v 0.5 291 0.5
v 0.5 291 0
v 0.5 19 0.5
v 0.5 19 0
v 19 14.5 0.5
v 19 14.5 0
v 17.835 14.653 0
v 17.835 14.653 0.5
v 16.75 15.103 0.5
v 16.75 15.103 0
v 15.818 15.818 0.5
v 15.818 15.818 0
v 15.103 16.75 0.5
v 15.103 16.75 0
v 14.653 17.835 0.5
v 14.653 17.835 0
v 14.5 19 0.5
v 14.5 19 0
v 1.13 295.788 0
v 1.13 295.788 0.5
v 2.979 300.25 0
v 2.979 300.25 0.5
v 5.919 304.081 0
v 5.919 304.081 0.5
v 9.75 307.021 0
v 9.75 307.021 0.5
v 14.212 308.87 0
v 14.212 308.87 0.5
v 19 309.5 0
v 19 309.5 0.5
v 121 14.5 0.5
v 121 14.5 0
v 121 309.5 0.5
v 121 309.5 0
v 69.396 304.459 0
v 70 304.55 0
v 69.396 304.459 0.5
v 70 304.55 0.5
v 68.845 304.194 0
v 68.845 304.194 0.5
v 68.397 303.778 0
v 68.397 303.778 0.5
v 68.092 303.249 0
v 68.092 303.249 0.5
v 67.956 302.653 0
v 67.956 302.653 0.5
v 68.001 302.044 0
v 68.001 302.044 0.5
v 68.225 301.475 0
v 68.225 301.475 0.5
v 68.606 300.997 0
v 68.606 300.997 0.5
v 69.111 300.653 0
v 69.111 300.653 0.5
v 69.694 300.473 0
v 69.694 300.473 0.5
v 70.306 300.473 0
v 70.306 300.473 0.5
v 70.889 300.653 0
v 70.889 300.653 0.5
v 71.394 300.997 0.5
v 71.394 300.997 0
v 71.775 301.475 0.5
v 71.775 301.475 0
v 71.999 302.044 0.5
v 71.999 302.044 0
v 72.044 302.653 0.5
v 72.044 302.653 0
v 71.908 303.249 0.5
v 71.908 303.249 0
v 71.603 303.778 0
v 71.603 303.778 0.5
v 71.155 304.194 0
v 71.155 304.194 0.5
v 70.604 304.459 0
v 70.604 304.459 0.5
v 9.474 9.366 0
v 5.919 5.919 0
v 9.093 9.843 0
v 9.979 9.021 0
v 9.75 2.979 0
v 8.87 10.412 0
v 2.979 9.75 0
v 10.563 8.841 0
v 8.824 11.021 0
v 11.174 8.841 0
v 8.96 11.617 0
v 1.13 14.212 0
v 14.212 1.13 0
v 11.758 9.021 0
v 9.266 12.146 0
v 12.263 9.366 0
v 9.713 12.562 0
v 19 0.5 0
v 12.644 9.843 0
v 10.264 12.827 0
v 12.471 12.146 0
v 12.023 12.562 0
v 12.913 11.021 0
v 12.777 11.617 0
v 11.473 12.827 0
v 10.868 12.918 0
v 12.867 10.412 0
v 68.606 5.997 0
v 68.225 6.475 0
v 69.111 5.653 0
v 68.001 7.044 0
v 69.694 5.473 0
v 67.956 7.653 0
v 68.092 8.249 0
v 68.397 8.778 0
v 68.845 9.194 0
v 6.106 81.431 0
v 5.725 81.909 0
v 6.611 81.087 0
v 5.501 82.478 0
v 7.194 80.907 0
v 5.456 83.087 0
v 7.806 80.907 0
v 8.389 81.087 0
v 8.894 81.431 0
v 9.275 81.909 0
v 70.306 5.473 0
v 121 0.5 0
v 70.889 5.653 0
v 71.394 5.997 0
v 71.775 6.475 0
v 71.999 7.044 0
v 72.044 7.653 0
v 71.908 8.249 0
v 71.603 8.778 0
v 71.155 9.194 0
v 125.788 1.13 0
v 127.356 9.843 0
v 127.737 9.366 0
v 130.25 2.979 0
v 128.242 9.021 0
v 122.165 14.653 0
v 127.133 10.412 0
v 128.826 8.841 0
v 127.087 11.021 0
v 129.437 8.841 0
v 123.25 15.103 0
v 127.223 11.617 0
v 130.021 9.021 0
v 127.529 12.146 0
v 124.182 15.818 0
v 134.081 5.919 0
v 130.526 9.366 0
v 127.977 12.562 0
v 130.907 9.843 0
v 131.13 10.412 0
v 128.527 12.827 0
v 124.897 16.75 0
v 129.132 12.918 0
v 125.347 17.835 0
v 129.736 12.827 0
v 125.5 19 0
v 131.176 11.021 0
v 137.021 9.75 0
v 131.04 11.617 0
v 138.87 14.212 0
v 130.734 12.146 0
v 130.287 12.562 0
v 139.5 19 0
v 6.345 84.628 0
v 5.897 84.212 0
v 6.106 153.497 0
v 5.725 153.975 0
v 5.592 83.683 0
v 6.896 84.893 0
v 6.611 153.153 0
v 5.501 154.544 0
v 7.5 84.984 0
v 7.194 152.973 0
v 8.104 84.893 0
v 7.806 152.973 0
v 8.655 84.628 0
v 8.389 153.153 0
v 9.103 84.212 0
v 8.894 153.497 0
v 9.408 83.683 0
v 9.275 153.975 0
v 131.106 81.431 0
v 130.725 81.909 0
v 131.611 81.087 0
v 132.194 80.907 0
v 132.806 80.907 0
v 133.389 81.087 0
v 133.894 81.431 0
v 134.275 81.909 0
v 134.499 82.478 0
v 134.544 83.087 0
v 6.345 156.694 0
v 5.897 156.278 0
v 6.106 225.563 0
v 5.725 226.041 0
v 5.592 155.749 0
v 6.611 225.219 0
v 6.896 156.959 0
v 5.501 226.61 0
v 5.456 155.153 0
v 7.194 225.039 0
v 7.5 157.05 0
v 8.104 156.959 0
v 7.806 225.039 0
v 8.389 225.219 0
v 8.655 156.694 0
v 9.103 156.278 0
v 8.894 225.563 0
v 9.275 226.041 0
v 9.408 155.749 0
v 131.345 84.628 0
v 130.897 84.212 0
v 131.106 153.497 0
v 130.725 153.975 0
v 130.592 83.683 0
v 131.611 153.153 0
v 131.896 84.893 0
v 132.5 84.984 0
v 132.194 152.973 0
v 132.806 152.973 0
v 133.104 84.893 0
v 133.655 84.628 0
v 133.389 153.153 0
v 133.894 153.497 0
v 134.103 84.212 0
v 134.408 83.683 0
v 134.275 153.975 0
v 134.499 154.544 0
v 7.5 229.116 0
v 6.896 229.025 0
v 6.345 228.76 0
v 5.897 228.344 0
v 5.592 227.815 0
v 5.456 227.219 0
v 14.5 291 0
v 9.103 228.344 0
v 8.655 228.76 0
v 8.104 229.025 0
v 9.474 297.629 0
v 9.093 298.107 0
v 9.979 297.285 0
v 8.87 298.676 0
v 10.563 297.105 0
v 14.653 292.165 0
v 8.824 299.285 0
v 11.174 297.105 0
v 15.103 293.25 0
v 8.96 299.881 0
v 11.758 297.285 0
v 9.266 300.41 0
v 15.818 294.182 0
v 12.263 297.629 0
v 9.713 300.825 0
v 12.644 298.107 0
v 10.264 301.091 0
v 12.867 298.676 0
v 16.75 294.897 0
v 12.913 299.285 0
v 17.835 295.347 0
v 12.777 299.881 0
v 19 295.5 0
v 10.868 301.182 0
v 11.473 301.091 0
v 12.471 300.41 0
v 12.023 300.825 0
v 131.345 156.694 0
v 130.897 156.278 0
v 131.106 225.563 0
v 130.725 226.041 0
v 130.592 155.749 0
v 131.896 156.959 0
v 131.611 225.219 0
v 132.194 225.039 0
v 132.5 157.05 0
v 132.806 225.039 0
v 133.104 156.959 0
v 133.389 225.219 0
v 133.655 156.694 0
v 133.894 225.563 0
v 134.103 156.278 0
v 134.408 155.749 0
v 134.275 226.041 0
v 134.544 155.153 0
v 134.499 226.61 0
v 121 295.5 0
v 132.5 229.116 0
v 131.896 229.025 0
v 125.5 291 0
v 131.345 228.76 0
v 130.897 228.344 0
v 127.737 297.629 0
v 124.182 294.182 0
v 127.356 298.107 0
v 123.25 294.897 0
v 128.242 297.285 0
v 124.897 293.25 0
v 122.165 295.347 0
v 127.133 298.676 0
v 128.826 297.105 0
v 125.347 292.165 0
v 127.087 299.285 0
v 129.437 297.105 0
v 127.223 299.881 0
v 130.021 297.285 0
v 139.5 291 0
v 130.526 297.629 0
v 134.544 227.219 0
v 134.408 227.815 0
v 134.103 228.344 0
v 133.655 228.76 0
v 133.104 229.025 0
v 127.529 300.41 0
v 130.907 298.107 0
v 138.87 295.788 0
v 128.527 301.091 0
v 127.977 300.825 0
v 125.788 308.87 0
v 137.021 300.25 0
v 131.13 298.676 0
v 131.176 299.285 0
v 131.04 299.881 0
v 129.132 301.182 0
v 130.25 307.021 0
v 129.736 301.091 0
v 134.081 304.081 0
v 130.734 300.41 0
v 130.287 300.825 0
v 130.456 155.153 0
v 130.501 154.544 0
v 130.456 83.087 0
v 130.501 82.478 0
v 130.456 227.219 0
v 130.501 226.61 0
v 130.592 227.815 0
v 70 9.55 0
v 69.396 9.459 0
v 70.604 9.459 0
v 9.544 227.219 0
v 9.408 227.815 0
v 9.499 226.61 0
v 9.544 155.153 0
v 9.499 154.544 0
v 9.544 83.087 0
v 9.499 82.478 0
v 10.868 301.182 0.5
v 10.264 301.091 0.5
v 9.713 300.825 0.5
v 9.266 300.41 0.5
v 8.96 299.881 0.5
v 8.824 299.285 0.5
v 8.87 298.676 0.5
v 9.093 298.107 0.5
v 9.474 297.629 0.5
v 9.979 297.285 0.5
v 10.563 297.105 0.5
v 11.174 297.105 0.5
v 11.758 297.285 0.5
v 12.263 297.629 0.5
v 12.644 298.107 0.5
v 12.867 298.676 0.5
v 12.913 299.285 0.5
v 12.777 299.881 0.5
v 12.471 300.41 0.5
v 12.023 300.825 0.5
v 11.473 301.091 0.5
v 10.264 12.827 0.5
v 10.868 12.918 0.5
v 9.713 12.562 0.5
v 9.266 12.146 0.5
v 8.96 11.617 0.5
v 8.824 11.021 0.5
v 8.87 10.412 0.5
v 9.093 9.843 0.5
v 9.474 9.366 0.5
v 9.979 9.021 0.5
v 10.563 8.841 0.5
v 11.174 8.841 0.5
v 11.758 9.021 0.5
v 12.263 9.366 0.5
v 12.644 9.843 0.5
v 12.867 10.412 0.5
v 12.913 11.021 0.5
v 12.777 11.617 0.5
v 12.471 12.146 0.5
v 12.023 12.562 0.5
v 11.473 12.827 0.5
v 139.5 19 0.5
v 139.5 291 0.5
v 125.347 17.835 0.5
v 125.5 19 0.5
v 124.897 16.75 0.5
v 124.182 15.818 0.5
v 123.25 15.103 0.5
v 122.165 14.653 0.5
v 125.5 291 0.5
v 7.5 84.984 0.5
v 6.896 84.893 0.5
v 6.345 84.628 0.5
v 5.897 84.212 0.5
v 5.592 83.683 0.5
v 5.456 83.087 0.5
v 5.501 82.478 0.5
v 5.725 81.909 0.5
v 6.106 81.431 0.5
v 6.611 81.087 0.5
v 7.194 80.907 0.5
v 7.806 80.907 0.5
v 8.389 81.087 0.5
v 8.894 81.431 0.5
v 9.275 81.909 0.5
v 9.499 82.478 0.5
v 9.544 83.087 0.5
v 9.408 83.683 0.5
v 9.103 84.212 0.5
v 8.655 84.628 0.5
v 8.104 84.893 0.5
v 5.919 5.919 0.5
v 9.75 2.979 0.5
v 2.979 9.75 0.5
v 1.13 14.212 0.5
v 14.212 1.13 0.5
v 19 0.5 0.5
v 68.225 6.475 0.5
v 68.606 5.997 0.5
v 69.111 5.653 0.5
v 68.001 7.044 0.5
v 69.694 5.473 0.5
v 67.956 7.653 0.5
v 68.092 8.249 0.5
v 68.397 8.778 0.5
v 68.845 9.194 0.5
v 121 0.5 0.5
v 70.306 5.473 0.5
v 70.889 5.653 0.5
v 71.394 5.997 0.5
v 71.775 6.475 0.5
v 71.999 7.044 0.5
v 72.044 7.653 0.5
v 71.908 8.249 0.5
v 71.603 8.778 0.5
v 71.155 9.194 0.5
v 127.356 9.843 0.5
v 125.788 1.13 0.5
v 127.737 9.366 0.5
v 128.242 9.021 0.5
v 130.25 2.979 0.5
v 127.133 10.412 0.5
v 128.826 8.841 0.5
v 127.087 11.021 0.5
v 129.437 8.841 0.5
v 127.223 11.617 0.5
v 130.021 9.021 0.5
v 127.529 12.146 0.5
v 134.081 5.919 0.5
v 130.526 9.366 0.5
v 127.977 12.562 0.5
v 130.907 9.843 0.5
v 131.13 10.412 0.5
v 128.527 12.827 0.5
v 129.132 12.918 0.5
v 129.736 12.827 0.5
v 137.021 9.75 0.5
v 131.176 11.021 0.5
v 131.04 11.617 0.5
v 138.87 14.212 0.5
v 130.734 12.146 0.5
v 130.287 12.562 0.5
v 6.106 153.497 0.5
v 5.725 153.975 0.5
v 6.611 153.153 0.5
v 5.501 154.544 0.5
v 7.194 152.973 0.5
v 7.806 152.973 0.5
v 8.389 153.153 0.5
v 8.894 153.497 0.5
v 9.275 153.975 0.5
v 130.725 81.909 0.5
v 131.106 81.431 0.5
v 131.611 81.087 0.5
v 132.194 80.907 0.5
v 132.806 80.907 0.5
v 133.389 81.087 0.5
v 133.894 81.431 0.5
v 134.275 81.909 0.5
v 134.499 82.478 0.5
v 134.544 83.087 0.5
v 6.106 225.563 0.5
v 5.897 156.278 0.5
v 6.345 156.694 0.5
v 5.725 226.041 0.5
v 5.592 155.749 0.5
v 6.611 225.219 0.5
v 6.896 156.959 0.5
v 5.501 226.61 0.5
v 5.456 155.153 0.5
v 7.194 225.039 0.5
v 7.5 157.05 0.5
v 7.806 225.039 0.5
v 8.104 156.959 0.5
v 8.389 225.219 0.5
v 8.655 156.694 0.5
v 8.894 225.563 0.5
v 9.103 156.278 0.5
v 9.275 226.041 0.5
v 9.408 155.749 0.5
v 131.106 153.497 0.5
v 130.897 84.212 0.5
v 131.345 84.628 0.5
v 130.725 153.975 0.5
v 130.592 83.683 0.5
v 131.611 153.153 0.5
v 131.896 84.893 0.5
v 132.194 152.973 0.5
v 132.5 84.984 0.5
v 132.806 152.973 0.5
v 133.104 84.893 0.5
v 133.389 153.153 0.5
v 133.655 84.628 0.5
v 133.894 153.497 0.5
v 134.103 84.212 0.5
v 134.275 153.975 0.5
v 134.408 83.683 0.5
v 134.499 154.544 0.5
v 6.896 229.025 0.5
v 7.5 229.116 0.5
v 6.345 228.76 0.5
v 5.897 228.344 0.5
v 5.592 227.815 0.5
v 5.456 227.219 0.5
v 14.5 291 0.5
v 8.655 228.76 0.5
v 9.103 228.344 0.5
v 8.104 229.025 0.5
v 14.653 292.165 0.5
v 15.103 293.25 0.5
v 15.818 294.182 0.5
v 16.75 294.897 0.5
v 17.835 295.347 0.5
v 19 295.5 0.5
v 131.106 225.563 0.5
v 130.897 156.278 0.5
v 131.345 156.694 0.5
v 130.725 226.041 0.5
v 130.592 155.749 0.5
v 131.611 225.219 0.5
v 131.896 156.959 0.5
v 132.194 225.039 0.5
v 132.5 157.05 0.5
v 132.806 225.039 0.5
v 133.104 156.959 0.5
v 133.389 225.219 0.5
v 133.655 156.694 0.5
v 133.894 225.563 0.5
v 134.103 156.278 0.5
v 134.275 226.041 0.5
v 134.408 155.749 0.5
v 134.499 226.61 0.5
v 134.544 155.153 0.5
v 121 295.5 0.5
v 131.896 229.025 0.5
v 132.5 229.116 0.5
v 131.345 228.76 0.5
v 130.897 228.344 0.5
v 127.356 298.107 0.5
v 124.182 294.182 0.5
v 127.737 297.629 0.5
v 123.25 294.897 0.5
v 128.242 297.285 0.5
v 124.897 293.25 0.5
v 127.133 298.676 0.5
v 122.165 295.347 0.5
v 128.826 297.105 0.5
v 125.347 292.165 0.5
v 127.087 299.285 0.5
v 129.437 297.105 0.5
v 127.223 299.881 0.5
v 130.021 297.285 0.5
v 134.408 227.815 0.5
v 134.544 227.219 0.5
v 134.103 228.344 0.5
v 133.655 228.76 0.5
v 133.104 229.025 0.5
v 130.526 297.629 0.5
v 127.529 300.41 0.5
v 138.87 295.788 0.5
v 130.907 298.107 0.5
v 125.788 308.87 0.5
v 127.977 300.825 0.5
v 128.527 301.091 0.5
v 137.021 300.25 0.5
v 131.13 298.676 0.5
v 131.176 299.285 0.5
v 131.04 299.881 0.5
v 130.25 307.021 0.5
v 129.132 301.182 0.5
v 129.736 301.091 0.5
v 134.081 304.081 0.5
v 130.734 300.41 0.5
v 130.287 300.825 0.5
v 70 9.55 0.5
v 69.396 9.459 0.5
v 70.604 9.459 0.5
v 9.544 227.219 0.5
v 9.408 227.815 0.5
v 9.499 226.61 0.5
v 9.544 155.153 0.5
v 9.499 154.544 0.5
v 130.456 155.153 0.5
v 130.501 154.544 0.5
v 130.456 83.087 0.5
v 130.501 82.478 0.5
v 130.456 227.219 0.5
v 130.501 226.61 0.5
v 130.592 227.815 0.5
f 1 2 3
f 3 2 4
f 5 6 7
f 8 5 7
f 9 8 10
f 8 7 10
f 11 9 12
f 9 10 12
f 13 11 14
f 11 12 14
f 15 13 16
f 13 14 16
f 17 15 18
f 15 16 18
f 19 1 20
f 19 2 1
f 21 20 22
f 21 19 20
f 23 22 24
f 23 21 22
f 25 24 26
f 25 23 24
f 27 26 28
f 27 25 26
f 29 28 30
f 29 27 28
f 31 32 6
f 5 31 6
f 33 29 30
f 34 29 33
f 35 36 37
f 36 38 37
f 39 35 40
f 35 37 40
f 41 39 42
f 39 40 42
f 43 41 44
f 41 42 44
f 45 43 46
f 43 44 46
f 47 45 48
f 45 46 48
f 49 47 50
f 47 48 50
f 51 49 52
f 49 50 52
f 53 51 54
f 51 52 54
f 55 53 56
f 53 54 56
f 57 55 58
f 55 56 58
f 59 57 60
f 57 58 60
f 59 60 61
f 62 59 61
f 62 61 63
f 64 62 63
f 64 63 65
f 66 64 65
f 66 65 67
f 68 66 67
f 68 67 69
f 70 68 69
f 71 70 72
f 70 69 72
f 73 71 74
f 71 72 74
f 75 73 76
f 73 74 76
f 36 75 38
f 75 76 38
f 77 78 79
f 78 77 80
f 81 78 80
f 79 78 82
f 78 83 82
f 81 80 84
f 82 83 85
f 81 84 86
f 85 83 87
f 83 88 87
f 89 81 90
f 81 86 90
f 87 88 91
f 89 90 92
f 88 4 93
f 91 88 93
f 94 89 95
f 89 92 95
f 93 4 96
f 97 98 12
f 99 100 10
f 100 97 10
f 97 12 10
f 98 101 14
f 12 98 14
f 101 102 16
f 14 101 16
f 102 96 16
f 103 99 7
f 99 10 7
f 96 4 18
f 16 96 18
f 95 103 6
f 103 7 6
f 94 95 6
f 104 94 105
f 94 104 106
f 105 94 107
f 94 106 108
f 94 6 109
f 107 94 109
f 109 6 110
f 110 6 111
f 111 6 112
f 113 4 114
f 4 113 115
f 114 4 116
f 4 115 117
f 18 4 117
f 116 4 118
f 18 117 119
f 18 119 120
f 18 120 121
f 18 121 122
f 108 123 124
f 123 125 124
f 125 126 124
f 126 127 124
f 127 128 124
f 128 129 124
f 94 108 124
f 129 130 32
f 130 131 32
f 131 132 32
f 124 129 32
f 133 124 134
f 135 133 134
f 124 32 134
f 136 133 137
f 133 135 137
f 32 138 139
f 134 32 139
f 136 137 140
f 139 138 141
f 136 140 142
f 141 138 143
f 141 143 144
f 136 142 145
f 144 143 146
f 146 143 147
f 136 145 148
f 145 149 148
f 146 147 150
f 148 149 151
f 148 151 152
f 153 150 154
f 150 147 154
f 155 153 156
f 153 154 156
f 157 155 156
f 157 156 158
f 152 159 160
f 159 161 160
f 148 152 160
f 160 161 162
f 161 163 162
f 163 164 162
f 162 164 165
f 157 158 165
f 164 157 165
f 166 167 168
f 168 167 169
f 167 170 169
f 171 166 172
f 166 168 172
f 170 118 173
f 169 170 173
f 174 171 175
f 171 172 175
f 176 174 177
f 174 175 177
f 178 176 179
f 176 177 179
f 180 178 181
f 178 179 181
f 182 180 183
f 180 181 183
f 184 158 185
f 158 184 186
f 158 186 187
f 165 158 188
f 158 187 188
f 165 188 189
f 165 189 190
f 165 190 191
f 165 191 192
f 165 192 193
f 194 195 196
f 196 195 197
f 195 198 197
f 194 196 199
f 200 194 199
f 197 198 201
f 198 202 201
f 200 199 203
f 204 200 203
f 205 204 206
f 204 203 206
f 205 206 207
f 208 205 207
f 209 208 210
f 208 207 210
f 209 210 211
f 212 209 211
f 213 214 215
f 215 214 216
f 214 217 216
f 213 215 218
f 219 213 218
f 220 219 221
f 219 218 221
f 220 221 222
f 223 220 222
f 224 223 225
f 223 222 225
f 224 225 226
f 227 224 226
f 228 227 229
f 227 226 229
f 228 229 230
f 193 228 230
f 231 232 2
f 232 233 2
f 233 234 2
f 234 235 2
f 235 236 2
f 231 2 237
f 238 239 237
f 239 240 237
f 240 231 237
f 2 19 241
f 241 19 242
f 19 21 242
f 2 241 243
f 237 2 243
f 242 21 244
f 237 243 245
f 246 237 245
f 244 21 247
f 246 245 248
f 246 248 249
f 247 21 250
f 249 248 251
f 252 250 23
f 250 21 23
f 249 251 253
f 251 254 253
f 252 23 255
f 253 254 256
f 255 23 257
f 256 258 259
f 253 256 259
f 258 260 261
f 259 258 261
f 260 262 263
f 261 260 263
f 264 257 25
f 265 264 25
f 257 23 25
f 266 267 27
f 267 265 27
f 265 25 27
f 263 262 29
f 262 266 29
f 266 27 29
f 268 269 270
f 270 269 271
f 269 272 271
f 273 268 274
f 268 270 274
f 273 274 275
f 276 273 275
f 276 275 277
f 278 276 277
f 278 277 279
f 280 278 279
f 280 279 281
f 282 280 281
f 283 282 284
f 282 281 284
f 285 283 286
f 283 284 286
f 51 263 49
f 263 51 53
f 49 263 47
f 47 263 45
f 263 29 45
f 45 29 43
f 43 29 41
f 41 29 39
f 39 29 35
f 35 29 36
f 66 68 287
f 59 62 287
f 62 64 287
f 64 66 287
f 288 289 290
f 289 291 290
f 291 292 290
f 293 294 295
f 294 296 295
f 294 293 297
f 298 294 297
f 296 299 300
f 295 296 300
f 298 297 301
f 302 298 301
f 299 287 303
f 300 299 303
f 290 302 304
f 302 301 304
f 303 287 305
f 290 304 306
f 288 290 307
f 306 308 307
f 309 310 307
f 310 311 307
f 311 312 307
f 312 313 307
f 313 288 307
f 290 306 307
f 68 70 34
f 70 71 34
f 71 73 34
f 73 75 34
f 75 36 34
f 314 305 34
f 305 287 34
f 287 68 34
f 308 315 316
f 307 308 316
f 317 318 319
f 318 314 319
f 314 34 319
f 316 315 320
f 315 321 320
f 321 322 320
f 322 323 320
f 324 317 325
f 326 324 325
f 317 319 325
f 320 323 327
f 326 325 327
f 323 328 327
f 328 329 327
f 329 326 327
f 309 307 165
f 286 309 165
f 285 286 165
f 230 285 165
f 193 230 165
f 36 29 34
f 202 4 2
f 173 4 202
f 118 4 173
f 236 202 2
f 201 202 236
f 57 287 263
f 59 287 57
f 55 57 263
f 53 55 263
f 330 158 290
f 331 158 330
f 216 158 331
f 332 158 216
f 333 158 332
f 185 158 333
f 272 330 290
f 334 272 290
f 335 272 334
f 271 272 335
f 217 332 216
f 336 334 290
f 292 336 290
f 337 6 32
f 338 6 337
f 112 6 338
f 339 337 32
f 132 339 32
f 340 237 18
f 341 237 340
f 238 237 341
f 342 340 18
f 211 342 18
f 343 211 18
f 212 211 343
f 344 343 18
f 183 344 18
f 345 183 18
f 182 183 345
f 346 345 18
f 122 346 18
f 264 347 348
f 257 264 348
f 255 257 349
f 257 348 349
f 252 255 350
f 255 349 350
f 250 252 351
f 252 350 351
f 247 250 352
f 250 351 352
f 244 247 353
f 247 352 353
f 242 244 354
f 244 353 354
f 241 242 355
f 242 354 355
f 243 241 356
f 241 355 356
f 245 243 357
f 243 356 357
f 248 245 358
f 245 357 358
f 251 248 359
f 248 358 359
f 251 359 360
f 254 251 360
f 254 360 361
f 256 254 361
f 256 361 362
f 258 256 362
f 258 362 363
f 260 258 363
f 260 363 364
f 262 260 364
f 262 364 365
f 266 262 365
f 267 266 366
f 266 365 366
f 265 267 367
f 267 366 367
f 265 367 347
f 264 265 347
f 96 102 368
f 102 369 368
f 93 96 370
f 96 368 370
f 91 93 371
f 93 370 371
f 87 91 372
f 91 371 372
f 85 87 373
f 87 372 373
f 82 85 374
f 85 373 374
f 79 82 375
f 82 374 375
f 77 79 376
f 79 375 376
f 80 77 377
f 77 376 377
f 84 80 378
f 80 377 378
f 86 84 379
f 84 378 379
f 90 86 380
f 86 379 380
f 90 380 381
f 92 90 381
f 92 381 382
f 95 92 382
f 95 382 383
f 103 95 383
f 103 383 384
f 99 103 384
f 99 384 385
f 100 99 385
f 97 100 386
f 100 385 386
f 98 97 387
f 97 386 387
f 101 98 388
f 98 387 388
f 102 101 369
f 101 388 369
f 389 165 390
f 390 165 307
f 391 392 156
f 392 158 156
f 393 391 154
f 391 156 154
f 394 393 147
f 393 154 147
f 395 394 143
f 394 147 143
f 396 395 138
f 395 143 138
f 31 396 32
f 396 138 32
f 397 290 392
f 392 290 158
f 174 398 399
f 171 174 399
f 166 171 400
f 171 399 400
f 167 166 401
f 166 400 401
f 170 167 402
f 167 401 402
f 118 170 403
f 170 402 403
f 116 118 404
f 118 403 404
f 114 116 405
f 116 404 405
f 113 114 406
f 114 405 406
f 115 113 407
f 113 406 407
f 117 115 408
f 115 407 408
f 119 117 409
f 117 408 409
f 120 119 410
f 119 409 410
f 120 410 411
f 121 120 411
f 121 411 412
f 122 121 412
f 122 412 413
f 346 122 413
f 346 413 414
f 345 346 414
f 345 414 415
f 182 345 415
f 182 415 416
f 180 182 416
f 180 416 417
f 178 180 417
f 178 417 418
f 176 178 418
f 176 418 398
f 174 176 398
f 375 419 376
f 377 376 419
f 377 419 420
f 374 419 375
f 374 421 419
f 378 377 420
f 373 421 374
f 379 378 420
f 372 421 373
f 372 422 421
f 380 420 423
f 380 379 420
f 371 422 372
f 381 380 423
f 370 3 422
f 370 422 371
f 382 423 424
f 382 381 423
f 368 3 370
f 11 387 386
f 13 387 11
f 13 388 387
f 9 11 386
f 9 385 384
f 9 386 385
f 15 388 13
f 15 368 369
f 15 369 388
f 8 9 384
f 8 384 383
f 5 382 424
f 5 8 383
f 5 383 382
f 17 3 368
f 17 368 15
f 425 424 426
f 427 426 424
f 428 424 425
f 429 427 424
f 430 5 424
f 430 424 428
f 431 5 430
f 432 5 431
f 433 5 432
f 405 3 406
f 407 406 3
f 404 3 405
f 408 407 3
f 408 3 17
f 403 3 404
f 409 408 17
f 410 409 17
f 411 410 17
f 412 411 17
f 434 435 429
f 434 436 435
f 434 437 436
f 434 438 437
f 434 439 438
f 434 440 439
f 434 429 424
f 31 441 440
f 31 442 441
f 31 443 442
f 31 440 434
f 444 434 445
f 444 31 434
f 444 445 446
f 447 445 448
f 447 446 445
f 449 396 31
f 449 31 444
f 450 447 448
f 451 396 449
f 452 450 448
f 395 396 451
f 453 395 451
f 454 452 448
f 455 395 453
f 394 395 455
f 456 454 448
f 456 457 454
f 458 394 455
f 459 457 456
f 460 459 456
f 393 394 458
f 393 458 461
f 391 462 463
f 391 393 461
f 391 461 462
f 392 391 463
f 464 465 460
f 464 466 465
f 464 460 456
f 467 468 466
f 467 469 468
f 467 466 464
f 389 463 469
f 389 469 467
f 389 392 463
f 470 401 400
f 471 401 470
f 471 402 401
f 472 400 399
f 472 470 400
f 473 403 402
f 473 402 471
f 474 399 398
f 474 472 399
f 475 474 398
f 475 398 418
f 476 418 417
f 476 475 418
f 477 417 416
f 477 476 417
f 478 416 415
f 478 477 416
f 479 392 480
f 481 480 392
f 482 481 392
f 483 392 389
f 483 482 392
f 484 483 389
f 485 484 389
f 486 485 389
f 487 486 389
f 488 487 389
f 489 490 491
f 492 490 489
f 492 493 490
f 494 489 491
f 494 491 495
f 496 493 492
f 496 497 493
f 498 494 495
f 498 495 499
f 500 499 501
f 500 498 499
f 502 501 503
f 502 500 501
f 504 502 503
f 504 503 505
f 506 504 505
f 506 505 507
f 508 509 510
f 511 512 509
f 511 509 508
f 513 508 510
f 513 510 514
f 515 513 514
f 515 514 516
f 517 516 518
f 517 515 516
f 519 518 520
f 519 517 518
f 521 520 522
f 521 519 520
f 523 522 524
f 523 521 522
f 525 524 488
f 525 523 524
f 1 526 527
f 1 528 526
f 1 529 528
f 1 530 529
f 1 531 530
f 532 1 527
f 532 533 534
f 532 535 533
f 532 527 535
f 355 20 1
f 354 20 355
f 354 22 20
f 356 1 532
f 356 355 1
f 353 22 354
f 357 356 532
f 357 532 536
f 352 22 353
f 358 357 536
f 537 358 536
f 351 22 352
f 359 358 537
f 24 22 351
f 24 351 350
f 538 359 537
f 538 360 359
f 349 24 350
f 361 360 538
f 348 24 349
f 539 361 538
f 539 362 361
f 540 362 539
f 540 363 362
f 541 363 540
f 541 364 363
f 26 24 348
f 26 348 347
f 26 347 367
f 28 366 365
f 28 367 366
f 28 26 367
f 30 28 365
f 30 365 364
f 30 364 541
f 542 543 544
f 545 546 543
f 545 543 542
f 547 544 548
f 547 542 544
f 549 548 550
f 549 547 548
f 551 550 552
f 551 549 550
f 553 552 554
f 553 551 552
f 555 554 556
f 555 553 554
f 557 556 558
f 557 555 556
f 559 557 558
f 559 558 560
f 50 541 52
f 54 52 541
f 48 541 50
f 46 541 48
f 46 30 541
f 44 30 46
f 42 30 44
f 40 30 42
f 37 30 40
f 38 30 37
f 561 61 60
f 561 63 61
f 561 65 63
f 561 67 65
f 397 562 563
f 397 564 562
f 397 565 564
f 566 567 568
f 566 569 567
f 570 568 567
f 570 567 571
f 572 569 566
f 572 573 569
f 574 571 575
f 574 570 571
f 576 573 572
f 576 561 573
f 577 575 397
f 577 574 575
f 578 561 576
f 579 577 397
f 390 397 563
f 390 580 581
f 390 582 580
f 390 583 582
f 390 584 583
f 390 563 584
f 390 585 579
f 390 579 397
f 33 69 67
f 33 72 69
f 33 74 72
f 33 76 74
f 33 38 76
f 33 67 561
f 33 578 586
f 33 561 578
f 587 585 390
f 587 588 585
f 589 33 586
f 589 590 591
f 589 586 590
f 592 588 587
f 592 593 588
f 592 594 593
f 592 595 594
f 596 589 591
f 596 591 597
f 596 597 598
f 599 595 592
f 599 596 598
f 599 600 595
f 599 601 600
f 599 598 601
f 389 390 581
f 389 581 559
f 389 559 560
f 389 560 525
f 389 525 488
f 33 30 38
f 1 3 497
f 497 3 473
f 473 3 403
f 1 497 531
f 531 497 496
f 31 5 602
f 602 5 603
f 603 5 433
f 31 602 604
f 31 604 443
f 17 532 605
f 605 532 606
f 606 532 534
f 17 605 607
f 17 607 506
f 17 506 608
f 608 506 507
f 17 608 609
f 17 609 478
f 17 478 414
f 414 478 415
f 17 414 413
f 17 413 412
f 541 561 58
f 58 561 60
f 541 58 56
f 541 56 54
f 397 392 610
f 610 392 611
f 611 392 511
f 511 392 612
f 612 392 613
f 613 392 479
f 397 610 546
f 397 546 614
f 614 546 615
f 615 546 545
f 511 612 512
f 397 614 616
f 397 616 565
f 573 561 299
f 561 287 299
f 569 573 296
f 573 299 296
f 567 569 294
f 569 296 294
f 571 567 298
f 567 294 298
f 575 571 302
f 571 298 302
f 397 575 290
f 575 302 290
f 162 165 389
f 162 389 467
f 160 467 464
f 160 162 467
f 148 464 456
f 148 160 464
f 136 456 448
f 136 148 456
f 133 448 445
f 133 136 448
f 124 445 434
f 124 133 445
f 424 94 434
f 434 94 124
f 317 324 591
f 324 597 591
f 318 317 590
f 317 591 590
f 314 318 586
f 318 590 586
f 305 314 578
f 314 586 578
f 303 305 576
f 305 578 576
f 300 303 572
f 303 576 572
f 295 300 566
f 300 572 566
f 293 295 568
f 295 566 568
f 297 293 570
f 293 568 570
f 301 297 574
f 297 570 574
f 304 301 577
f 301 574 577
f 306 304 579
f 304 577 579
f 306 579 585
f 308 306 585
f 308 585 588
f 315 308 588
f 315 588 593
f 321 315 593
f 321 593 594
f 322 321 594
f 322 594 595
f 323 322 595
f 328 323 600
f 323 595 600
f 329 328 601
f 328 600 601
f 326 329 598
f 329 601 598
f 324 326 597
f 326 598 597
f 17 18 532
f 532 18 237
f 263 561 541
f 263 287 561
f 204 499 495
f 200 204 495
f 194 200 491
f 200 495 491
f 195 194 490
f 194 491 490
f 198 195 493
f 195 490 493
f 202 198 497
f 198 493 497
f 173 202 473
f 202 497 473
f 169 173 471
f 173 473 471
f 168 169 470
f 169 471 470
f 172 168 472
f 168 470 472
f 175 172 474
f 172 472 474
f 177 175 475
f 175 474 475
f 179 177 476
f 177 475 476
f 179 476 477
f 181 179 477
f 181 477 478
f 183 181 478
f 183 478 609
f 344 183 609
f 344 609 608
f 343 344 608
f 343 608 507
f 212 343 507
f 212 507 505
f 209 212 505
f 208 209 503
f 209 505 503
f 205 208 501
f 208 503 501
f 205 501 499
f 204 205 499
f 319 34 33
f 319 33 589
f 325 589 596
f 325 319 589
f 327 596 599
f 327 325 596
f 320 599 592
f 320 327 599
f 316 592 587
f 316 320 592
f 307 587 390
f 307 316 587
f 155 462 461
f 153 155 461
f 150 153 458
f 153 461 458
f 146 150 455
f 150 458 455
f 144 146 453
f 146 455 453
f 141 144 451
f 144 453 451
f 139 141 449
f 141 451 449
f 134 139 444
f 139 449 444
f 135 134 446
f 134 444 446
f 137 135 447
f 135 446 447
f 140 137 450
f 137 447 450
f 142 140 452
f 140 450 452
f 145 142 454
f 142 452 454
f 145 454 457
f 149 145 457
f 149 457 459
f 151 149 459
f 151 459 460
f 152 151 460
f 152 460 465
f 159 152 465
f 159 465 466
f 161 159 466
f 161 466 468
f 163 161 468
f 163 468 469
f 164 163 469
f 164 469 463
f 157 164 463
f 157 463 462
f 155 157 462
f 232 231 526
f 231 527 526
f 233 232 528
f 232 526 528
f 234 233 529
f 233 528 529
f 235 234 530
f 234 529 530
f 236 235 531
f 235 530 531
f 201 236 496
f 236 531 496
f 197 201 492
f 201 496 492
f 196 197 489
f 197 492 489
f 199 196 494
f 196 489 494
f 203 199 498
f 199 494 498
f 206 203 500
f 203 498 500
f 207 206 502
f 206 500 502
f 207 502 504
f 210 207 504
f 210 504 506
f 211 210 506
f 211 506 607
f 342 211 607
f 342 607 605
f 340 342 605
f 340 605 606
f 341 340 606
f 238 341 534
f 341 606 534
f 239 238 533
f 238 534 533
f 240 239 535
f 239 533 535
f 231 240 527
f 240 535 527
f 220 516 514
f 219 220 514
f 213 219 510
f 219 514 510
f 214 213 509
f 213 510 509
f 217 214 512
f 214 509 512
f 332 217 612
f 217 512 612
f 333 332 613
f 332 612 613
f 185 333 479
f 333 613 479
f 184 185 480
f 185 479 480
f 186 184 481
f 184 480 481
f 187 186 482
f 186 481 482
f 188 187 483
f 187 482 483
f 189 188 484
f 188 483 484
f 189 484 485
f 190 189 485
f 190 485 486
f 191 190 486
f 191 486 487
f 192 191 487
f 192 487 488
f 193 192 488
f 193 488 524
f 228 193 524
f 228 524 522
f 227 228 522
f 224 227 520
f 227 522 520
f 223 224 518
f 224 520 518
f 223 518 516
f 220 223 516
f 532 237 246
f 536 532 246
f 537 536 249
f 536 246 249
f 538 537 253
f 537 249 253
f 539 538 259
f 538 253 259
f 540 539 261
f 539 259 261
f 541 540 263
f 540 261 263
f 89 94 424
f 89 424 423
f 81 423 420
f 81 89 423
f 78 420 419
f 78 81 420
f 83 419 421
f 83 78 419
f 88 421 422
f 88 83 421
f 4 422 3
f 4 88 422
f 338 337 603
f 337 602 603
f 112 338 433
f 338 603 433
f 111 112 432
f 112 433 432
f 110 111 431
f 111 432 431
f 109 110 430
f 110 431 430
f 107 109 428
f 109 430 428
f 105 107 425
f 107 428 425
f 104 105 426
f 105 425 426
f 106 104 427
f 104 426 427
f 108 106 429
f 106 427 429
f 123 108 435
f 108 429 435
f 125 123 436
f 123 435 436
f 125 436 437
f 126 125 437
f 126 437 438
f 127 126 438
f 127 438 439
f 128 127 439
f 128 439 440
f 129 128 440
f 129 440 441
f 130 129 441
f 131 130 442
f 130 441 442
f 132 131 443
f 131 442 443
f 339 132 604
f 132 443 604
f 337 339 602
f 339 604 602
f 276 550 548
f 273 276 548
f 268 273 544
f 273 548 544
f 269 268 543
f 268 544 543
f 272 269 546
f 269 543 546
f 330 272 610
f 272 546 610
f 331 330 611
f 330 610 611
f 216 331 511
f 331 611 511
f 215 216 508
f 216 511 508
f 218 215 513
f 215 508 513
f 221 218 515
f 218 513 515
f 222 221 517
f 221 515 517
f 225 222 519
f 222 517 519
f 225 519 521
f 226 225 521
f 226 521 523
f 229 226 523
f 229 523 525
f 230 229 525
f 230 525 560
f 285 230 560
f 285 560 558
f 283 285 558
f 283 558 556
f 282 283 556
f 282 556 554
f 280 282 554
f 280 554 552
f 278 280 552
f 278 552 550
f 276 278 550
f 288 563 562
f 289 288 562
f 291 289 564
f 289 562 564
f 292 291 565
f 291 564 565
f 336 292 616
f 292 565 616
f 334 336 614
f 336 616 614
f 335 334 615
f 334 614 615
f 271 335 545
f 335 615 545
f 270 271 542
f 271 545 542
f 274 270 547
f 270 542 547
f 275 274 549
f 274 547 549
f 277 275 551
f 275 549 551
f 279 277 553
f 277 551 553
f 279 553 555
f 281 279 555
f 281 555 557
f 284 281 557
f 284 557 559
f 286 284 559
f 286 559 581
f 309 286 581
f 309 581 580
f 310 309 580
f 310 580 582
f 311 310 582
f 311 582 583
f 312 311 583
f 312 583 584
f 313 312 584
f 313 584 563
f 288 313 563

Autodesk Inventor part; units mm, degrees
ref_plane "YZ Plane" through (0, 0, 0) normal (1, 0, 0) x (0, 1, 0)
ref_plane "XZ Plane" through (0, 0, 0) normal (0, 1, 0) x (-1, 0, 0)
ref_plane "XY Plane" through (0, 0, 0) normal (0, 0, 1) x (1, 0, 0)
sketch "Sketch1" plane through (0, 0, 0) normal (0, 0, 1) x (1, 0, 0)
  line L0 (0, 0) -> (140, 0) construction
  line L1 (140, 0) -> (140, 310) construction
  line L2 (140, 310) -> (0, 310) construction
  line L3 (0, 310) -> (0, 0) construction
  line L4 (15, 295) -> (125, 295) construction
  line L5 (125, 295) -> (125, 15) construction
  line L6 (125, 15) -> (15, 15) construction
  line L7 (15, 15) -> (15, 295) construction
  line L8 (15, 295) -> (125, 295) construction
  line L9 (70, 314.0975) -> (70, 322.6254) construction
  line L10 (15, 295) -> (15, 269.8596) construction
  line L11 (125, 295) -> (125, 292.6022) construction
  line L12 (0, 165.5) -> (-18, 165.5) construction
  line L13 (-18, 165.5) -> (-18, 185.5) construction
  line L14 (-18, 185.5) -> (0, 185.5) construction
  line L15 (0, 185.5) -> (0, 165.5) construction
  line L16 (-24.3067, 155) -> (-34.4998, 155) construction
  circle A0 centre (-9, 175.5) radius 3 construction
  line L17 (-18, 185.5) -> (0, 205.5) construction
  line L18 (0, 144.5) -> (-18, 144.5) construction
  line L19 (-18, 144.5) -> (-18, 124.5) construction
  circle A1 centre (-9, 134.5) radius 3 construction
  line L20 (-18, 124.5) -> (0, 104.5) construction
  line L21 (140, 165.5) -> (158, 165.5) construction
  line L22 (158, 165.5) -> (158, 185.5) construction
  circle A2 centre (149, 175.5) radius 3 construction
  line L23 (158, 185.5) -> (140, 205.5) construction
  line L24 (158, 144.5) -> (158, 124.5) construction
  line L25 (140, 144.5) -> (158, 144.5) construction
  circle A3 centre (149, 134.5) radius 3 construction
  line L26 (158, 124.5) -> (140, 104.5) construction
  line L27 (0, 300.2843) -> (9.7157, 310) construction
  line L28 (140, 300.2843) -> (130.2843, 310) construction
  line L29 (0, 9.7157) -> (9.7157, 0) construction
  line L30 (140, 9.7157) -> (130.2843, 0) construction
  line L31 (70, 295) -> (70, 310) construction
  line L32 (0, 155) -> (15, 155) construction
  line L33 (23.9173, 286.0827) -> (15, 295) construction
  line L34 (16.5096, 292.7523) -> (17.2477, 293.4904) construction
  line L35 (23.9173, 286.0827) -> (16.8787, 293.1213) construction
  line L36 (123.4904, 292.7523) -> (122.7523, 293.4904) construction
  line L37 (15, 17.2679) -> (15, 136.2679) construction
  arc A4 (14, 16.2679) -> (15, 17.2679) centre (14, 17.2679) ccw construction
  line L38 (14, 16.2679) -> (12, 16.2679) construction
  arc A5 (17, 17.2679) -> (18, 16.2679) centre (18, 17.2679) ccw construction
  spline S0 degree 3 poles (123.4904, 292.7523) (126.7806, 289.462) (122.6845, 284.0803) (122.5, 267.9145) knots 0 0 0 0 1 1 1 1 construction
  line L39 (15.2393, 288.9289) -> (15.2393, 218.384) construction
  line L40 (125, 148.5289) -> (125, 140.8711) construction
  line L41 (-110.1015, 148.4668) -> (-137.337, 121.2312) construction
  line L42 (-137.337, 121.2312) -> (-99.9418, 121.2312) construction
  line L43 (209.7417, 198.7679) -> (209.7417, 184.7679) construction
  line L44 (15, 148.5289) -> (15, 140.2675) construction
  line L45 (125, 148.5289) -> (125, 140.2675) construction
  spline S1 degree 4 poles (17.2477, 293.4904) (18.1955, 294.4381) (19.6714, 295.0826) (20.7017, 295) (21.8623, 295) knots 0 0 0 0 0 1 1 1 1 1 construction
  spline S2 degree 3 poles (122.7523, 293.4904) (121.4886, 294.7541) (119.4432, 295.1927) (118.1377, 295) knots 0 0 0 0 1 1 1 1 construction
  line L46 (118.1377, 295) -> (21.8623, 295) construction
  line L47 (16.8787, 293.1213) -> (23.2316, 286.7684) construction
  arc A6 (19, 310) -> (0, 291) centre (19, 291) ccw construction
  arc A7 (19, 295) -> (15, 291) centre (19, 291) ccw construction
  line L48 (19, 291) -> (10, 291) construction
  line L49 (19, 291) -> (19, 300) construction
  line L50 (16.1716, 293.8284) -> (5.565, 304.435) construction
  circle A8 centre (10.8683, 299.1317) radius 2 construction
  line L51 (9.8231, 300.915) -> (9.085, 300.1769) construction
  line L52 (11.9134, 297.3485) -> (12.6515, 298.0866) construction
  circle A9 centre (70, 302.5) radius 2 construction
  circle A10 centre (7.5, 155) radius 2 construction
  circle A11 centre (7.5, 227.0659) radius 2 construction
  line L53 (7.5, 155) -> (7.5, 227.0659) construction
  line L54 (7.5, 227.0659) -> (7.5, 299.1317) construction
  arc A12 (140, 291) -> (121, 310) centre (121, 291) ccw construction
  arc A13 (125, 291) -> (121, 295) centre (121, 291) ccw construction
  circle A14 centre (129.1317, 299.1317) radius 2 construction
  circle A15 centre (132.5, 155) radius 2 construction
  circle A16 centre (132.5, 227.0659) radius 2 construction
  circle A17 centre (10.8683, 10.8683) radius 2 construction
  circle A18 centre (70, 7.5) radius 2 construction
  circle A19 centre (7.5, 82.9341) radius 2 construction
  circle A20 centre (132.5, 82.9341) radius 2 construction
  circle A21 centre (129.1317, 10.8683) radius 2 construction
  arc A22 (0, 19) -> (19, 0) centre (19, 19) ccw construction
  arc A23 (15, 19) -> (19, 15) centre (19, 19) ccw construction
  arc A24 (121, 0) -> (140, 19) centre (121, 19) ccw construction
  arc A25 (121, 15) -> (125, 19) centre (121, 19) ccw construction
  circle A26 centre (10.8683, 299.1317) radius 7.5 construction
  line L55 (4.4716, 303.3416) -> (6.8718, 305.7419) construction
  line L56 (15, 140.2675) -> (15, 136.2679) construction
  line L57 (125, 138.6822) -> (125, 140.2675) construction
  line L58 (15, 138.6822) -> (15, 140.2675) construction
  line L59 (19, 15) -> (121, 15) construction
  line L60 (121, 0) -> (19, 0) construction
  line L61 (15, 291) -> (15, 19) construction
  line L62 (0, 19) -> (0, 291) construction
  line L63 (125, 291) -> (125, 19) construction
  line L64 (140, 19) -> (140, 291) construction
  line L65 (19, 295) -> (121, 295) construction
  line L66 (121, 310) -> (19, 310) construction
  arc A27 (132.5, 291) -> (121, 302.5) centre (121, 291) ccw construction
  arc A28 (139.5, 291) -> (121, 309.5) centre (121, 291) ccw
  arc A29 (125.5, 291) -> (121, 295.5) centre (121, 291) ccw
  arc A30 (125.5, 291) -> (139.5, 291) centre (132.5, 291) ccw construction
  arc A31 (121, 309.5) -> (121, 295.5) centre (121, 302.5) ccw construction
  arc A32 (19, 309.5) -> (0.5, 291) centre (19, 291) ccw
  arc A33 (19, 295.5) -> (14.5, 291) centre (19, 291) ccw
  arc A34 (121, 0.5) -> (139.5, 19) centre (121, 19) ccw
  arc A35 (121, 14.5) -> (125.5, 19) centre (121, 19) ccw
  arc A36 (14.5, 19) -> (19, 14.5) centre (19, 19) ccw
  arc A37 (0.5, 19) -> (19, 0.5) centre (19, 19) ccw
  line L67 (139.5, 19) -> (139.5, 291)
  line L68 (125.5, 291) -> (125.5, 19)
  line L69 (121, 14.5) -> (19, 14.5)
  line L70 (19, 0.5) -> (121, 0.5)
  line L71 (14.5, 19) -> (14.5, 291)
  line L72 (0.5, 291) -> (0.5, 19)
  line L73 (121, 295.5) -> (19, 295.5)
  line L74 (19, 309.5) -> (121, 309.5)
  point P0 (70, 318.3615)
  point P1 (-29.4032, 155)
  point P2 (-18, 175.5)
  point P3 (-9, 185.5)
  point P4 (124.7607, 288.9289)
  point P5 (209.7417, 191.7679)
  point P6 (19.6961, 294.835)
  point P7 (120.3039, 294.835)
  point P8 (9.4541, 300.5459)
  point P9 (12.2825, 297.7175)
  dimension "d163" = 4
  dimension "d0" = 140
  dimension "d1" = 310
  dimension "d2" = 15
  dimension "d85" = 18
  dimension "d86" = 20
  dimension "d87" = 10.5
  dimension "d88" = 6
  dimension "d89" = 20
  dimension "d114" = 135
  dimension "d126" = 1
  dimension "d128" = 2
  dimension "d152" = 45
  dimension "d158" = 45
  dimension "d161" = 4
  dimension "d164" = 5.5
  dimension "d168" = 15
  dimension "d169" = 1
  dimension "d170" = 1
  dimension "d171" = 1
  dimension "expansion" = 0.5
  dimension "d201" = 0.5
extrude "Extrusion7" add sketch "Sketch1" along normal blind 0.5
hole "Hole1" at (129.1317, 299.1317, 0) at (70, 302.5, 0) at (10.8683, 299.1317, 0) at (7.5, 227.0659, 0) at (132.5, 227.0659, 0) at (132.5, 155, 0) at (7.5, 155, 0) at (132.5, 82.9341, 0) at (129.1317, 10.8683, 0) at (70, 7.5, 0) at (10.8683, 10.8683, 0) at (7.5, 82.9341, 0) direction (0, 0, 1) diameter 4.1 end through all
properties part number "GB-gasket"
